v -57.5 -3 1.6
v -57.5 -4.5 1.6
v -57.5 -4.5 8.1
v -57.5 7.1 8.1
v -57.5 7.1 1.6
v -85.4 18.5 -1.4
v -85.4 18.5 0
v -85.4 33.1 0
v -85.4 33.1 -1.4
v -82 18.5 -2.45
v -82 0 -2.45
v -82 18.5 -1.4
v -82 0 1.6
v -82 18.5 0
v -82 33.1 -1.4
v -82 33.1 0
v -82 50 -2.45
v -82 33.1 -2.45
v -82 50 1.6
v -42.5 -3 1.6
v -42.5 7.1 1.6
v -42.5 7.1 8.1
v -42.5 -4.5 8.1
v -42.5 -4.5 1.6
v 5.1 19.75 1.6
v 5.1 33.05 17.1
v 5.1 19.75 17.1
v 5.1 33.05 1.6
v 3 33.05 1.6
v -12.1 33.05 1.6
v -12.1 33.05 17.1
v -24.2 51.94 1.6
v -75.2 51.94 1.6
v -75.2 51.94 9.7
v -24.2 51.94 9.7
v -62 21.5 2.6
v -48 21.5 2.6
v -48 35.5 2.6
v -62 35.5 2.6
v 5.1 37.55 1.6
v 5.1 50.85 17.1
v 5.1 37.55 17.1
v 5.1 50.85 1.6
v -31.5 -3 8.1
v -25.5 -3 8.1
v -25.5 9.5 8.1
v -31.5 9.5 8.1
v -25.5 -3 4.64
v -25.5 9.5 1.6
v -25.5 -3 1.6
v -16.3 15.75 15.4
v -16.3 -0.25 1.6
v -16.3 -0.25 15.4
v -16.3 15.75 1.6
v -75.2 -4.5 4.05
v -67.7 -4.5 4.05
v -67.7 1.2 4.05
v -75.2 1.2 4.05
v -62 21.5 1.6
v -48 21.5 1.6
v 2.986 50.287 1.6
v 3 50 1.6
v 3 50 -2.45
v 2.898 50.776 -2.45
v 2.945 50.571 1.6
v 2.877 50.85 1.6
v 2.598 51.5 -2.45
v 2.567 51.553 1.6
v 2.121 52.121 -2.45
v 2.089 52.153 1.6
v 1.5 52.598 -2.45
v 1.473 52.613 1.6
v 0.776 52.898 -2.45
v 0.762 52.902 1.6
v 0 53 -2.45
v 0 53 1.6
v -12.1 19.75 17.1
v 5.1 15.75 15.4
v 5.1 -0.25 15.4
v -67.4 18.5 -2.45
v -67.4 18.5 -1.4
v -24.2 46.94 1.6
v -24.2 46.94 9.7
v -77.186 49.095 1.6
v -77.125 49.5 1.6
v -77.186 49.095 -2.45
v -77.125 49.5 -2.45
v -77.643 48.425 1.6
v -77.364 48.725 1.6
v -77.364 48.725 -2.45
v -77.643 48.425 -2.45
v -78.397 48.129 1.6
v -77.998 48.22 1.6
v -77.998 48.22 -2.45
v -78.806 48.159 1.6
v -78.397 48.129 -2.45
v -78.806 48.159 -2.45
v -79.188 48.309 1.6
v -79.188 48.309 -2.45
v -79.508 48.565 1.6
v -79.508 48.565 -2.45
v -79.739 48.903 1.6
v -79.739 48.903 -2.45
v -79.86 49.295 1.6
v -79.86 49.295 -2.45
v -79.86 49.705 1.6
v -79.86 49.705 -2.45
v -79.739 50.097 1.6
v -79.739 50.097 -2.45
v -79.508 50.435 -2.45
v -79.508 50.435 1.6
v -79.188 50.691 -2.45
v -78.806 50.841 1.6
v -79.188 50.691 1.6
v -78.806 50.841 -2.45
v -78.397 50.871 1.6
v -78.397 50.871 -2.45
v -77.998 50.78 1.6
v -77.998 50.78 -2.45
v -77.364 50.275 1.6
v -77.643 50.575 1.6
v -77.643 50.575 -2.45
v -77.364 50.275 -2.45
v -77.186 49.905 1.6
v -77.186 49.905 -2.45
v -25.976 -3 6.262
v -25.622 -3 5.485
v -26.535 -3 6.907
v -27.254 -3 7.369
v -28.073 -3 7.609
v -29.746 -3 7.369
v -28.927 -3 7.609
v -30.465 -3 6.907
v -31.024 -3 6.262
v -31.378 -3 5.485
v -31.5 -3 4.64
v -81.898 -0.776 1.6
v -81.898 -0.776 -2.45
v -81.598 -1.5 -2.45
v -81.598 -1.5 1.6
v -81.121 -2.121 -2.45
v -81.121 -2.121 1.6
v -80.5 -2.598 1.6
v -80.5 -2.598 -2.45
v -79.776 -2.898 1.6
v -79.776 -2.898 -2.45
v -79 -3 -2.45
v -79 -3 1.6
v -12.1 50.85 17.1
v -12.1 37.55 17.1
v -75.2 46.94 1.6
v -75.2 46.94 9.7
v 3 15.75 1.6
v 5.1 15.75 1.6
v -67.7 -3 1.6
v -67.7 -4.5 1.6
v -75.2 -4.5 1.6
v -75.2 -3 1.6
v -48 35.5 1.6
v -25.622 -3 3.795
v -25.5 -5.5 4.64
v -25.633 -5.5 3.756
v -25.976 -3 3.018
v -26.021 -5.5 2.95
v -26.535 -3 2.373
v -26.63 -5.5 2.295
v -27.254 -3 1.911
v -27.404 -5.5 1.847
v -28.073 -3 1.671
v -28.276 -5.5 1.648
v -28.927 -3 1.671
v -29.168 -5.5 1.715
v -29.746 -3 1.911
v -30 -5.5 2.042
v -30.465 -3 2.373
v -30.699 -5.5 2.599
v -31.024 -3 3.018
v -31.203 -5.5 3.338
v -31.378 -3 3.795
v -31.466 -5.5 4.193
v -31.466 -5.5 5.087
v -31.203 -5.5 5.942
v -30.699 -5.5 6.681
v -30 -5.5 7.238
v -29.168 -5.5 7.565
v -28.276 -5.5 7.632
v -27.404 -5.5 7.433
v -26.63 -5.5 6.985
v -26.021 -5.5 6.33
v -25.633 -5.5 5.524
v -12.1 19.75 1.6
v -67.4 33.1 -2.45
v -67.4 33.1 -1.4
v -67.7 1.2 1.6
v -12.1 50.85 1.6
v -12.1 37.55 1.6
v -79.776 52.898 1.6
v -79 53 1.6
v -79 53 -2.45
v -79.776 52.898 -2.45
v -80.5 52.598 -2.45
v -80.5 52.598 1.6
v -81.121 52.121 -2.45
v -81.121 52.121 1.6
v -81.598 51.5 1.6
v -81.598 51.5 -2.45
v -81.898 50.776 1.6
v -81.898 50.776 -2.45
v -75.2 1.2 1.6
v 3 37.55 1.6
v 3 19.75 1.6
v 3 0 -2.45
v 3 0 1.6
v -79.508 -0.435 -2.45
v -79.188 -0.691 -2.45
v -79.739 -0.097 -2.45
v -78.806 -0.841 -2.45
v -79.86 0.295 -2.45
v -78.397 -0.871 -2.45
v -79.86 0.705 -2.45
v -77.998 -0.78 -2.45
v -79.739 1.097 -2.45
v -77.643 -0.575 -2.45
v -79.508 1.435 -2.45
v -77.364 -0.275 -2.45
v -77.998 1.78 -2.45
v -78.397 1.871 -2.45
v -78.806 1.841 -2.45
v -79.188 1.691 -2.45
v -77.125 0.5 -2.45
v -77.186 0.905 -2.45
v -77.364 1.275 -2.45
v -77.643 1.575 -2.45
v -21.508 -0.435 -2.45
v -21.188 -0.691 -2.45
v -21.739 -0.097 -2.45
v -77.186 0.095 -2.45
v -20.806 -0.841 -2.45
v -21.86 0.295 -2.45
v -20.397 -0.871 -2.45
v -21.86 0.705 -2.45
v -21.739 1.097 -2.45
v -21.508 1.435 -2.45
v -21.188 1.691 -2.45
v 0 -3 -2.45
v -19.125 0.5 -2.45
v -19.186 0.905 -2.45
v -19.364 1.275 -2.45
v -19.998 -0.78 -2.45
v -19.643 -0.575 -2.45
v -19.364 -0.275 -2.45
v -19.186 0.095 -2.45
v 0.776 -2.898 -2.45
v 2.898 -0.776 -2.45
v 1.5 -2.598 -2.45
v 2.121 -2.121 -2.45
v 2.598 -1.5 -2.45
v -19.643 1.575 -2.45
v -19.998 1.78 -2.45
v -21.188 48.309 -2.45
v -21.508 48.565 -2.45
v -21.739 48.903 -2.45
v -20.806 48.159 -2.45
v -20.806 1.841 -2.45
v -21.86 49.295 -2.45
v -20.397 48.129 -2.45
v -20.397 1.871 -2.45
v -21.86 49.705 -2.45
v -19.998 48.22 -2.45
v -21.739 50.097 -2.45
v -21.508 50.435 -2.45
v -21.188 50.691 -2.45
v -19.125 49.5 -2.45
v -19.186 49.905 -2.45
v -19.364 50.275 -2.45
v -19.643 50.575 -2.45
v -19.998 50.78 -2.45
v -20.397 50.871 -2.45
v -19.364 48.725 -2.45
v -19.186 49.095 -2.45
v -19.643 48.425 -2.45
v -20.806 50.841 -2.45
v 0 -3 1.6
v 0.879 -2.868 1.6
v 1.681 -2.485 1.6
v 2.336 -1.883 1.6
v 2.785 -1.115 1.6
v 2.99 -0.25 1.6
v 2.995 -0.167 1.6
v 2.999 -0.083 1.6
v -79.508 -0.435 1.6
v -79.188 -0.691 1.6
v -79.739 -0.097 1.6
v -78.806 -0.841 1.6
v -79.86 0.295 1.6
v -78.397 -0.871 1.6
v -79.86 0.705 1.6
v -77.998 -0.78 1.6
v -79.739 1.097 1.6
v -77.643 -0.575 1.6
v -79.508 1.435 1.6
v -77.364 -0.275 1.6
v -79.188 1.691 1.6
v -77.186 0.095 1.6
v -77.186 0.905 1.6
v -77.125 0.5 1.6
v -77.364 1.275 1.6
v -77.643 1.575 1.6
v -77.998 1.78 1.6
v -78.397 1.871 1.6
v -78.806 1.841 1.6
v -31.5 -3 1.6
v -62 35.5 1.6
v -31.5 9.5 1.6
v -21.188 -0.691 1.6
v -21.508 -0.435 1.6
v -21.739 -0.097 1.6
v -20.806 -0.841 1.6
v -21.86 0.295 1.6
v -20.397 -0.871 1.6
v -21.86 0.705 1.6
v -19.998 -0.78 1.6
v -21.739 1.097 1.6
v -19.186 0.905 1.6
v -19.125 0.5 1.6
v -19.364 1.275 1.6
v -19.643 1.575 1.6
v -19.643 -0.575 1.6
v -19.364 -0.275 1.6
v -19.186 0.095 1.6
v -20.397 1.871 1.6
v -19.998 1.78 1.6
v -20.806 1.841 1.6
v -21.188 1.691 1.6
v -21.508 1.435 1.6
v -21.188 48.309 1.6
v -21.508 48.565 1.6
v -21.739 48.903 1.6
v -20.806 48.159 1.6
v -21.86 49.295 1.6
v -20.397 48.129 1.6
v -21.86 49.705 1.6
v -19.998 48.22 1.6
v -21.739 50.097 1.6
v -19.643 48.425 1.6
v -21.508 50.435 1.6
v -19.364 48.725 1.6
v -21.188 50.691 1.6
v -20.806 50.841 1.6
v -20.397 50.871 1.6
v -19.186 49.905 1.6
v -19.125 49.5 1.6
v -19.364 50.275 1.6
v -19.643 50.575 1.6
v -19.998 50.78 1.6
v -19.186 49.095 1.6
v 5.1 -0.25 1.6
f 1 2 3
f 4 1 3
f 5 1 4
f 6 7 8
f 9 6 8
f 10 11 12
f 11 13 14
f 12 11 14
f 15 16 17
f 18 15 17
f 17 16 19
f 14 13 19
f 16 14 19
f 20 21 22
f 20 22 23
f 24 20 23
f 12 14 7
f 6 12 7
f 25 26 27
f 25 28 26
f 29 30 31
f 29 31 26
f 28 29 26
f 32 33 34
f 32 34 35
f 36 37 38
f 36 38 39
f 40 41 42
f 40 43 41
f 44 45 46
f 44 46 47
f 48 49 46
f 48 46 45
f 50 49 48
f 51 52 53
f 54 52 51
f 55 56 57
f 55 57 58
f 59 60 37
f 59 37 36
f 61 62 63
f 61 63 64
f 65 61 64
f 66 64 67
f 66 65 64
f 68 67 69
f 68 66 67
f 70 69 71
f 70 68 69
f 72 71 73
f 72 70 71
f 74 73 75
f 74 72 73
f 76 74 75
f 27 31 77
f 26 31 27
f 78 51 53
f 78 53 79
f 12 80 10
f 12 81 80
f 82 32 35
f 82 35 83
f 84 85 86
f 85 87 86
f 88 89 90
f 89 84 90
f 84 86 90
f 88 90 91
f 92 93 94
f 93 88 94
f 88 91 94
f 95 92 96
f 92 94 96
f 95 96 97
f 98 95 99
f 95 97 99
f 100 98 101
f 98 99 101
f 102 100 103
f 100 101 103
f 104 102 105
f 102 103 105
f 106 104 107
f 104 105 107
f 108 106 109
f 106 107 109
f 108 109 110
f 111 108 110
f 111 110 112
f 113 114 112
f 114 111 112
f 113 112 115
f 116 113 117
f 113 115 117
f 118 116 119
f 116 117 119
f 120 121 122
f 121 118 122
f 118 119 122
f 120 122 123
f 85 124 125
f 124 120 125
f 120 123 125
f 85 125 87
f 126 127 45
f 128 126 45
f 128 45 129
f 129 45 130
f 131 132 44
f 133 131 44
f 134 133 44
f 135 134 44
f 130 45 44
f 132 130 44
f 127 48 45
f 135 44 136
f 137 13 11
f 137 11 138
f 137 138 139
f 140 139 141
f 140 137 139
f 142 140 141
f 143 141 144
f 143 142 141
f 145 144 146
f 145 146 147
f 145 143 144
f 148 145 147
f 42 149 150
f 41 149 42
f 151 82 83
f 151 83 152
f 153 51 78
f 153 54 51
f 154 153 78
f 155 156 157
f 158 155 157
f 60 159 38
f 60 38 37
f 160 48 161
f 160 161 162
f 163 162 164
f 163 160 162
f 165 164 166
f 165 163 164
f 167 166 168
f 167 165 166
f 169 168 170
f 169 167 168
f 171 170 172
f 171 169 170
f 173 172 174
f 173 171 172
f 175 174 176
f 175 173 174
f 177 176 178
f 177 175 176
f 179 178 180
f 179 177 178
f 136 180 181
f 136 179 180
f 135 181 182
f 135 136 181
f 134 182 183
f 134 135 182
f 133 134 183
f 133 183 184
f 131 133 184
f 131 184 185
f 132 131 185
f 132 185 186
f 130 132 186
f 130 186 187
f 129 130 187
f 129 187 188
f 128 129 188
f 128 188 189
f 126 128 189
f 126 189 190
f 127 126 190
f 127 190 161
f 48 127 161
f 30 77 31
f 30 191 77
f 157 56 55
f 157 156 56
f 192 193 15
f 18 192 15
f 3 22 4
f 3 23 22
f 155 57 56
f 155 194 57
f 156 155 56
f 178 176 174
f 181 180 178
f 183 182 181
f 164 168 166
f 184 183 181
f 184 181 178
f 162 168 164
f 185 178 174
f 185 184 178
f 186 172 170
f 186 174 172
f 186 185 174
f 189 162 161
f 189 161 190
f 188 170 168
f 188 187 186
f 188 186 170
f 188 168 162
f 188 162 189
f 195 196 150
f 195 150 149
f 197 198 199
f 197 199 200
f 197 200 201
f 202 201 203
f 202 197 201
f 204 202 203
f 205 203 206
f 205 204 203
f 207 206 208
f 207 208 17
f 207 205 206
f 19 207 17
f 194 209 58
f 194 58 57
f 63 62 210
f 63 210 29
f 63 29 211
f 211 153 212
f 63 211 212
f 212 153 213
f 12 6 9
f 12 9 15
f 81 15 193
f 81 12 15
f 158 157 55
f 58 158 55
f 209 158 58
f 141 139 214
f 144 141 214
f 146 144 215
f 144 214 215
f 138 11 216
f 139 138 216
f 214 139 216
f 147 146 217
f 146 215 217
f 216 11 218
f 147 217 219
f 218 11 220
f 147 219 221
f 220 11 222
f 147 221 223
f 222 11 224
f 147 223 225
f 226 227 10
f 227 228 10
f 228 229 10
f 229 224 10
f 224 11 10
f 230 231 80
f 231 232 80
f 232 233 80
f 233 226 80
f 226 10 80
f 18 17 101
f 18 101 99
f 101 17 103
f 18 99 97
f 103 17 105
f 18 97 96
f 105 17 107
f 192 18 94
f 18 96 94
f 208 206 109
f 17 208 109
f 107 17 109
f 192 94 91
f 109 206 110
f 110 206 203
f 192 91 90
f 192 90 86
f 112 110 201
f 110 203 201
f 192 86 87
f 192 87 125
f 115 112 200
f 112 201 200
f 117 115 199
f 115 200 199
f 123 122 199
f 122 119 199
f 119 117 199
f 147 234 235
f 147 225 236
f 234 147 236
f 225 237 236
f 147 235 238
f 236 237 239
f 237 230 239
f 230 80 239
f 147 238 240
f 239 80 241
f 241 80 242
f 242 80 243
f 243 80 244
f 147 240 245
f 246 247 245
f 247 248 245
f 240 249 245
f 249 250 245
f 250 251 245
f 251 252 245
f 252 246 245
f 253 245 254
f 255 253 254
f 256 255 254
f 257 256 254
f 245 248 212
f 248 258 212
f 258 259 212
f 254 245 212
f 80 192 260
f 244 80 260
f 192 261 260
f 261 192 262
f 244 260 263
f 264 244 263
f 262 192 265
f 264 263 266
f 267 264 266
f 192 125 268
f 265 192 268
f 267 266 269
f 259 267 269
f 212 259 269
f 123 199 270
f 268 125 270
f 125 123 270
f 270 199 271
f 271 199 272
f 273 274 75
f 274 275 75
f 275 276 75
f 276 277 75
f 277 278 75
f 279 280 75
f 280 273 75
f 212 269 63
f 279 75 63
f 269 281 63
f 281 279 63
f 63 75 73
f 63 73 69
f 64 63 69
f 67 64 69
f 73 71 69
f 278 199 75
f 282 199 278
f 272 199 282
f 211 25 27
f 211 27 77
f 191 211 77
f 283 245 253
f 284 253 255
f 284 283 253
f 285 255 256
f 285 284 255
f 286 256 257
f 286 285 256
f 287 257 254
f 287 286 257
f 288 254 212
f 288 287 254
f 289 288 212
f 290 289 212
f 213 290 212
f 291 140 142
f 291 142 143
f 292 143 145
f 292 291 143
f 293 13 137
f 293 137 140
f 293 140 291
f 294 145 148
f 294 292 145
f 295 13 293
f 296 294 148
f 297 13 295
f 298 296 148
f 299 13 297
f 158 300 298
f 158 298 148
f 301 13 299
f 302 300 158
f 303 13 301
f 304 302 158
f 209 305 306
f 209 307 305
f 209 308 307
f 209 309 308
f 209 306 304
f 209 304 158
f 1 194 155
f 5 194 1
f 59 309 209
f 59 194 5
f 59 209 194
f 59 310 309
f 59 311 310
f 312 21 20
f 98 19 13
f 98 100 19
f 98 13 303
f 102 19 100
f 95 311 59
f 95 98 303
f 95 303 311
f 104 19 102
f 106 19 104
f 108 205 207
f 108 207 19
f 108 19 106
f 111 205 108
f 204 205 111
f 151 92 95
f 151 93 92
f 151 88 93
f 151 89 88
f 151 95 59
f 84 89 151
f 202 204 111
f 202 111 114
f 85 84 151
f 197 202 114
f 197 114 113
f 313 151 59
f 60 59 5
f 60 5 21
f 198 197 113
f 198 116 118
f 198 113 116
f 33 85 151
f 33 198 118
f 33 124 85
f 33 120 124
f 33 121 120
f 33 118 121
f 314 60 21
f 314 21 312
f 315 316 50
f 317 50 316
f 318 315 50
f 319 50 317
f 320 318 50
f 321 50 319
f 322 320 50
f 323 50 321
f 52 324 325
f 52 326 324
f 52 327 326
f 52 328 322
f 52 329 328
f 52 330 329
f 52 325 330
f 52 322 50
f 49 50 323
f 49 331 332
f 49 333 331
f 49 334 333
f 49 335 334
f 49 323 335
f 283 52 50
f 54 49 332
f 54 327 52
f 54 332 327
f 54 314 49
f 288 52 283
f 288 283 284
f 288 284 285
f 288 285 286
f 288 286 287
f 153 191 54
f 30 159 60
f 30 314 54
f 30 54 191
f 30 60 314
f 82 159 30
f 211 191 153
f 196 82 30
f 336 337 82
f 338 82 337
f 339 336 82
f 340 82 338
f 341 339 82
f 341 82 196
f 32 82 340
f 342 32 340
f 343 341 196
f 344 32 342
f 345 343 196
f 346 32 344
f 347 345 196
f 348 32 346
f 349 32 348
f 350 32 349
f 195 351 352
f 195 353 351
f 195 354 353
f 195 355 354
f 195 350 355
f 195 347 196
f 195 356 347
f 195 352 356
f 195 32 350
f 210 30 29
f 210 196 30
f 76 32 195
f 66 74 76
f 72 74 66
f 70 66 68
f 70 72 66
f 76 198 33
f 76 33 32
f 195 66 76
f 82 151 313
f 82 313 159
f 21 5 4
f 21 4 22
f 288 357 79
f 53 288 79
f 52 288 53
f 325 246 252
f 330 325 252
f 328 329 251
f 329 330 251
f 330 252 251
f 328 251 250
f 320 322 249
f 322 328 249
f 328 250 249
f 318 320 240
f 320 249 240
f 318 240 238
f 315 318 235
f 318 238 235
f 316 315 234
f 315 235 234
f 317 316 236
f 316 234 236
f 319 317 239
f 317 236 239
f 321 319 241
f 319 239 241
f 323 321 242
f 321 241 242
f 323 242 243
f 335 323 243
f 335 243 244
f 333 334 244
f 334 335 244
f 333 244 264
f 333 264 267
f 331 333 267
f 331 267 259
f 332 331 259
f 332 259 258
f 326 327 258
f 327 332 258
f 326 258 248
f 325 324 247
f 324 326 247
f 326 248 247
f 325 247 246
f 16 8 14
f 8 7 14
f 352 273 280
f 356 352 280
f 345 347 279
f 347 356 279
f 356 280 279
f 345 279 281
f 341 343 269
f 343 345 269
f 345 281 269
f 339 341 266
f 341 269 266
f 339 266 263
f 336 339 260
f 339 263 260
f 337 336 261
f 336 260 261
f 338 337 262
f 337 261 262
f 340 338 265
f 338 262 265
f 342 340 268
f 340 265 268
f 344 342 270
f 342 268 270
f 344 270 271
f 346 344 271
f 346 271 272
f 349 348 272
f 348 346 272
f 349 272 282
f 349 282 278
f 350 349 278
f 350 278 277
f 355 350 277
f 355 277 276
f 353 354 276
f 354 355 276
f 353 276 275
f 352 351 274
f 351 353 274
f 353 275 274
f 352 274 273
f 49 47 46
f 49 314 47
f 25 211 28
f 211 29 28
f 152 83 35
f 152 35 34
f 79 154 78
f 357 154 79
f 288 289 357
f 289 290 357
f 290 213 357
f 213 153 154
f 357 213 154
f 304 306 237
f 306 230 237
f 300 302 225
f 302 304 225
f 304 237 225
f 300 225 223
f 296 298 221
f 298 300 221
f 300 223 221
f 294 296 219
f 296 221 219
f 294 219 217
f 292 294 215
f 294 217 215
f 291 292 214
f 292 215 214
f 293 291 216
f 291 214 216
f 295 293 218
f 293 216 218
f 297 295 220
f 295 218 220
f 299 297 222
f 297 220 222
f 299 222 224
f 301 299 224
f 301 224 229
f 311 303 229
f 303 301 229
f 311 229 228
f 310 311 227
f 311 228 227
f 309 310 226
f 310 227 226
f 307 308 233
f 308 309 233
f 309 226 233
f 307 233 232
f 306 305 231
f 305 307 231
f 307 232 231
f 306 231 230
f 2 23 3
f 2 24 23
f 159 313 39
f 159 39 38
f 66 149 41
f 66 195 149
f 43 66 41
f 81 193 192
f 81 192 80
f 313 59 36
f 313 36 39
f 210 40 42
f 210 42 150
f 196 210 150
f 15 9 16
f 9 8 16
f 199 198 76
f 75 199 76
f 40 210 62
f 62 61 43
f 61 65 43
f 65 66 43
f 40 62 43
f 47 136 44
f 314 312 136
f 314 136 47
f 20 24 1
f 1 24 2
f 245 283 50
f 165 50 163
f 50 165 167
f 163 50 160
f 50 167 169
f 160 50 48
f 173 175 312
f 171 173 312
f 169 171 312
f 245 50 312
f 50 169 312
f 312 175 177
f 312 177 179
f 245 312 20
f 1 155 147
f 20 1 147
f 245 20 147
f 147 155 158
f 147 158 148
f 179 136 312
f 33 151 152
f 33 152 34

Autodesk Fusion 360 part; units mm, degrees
sketch "Sketch1" plane through (0, 0, 0) normal (0, 0, 1) x (1, 0, 0)
  line L0 (0, -3) -> (-79, -3)
  line L1 (-82, 0) -> (-82, 50)
  line L2 (-79, 53) -> (0, 53)
  line L3 (3, 50) -> (3, 0)
  arc A0 (-79, 53) -> (-82, 50) centre (-79, 50) ccw
  arc A1 (-82, 0) -> (-79, -3) centre (-79, 0) ccw
  arc A2 (3, 50) -> (0, 53) centre (0, 50) ccw
  arc A3 (0, -3) -> (3, 0) centre (0, 0) ccw
  circle A4 centre (-78.5, 49.5) radius 1.375
  circle A5 centre (-78.5, 0.5) radius 1.375
  circle A6 centre (-20.5, 49.5) radius 1.375
  circle A7 centre (-20.5, 0.5) radius 1.375
  dimension "d1" = 3
  dimension "d2" = 85
  dimension "d3" = 56
  dimension "d4" = 49
  dimension "d5" = 0.5
  dimension "d6" = 0.5
  dimension "d7" = 2.75
  dimension "d8" = 2.75
  dimension "d9" = 3.5
  dimension "d10" = 2.75
  dimension "d11" = 2.75
  dimension "d12" = 58
  dimension "d13" = 58
  dimension "d14" = 49
  dimension "d15" = 49
extrude "Extrude1" add sketch "Sketch1" along normal blind 1.6
sketch "Sketch2" plane through (0, 0, 0) normal (0, 0, -1) x (1, 0, 0)
  circle A0 centre (-20.5, -49.5) radius 1.375
  circle A1 centre (-78.5, -0.5) radius 1.375
  circle A2 centre (-20.5, -0.5) radius 1.375
  circle A3 centre (-78.5, -49.5) radius 1.375
  arc A4 (-79, 3) -> (-82, 0) centre (-79, 0) ccw
  line L0 (-82, 0) -> (-82, -50)
  arc A5 (-82, -50) -> (-79, -53) centre (-79, -50) ccw
  line L1 (-79, -53) -> (0, -53)
  arc A6 (0, -53) -> (3, -50) centre (0, -50) ccw
  line L2 (3, -50) -> (3, 0)
  arc A7 (3, 0) -> (0, 3) centre (0, 0) ccw
  line L3 (0, 3) -> (-79, 3)
  line L4 (-67.4, -18.5) -> (-85.4, -18.5)
  line L5 (-85.4, -18.5) -> (-85.4, -33.1)
  line L6 (-85.4, -33.1) -> (-67.4, -33.1)
  line L7 (-67.4, -33.1) -> (-67.4, -18.5)
  dimension "d18" = 14.6
  dimension "d19" = 19.9
  dimension "d20" = 18
  dimension "d21" = 3.4
extrude "Extrude2" add sketch "Sketch2" along normal blind 1.4 contours L0 L4 L6 L7 | L0 L4 L5 L6
extrude "Extrude3" add 1 faces at (-36.7049, 22.8333, 0) along direction (0, 0, -1) blind 2.45
sketch "Sketch3" plane through (0, 0, 1.6) normal (0, 0, 1) x (-1, 0, 0)
  circle A0 centre (20.5, -49.5) radius 1.375
  circle A1 centre (78.5, -0.5) radius 1.375
  circle A2 centre (20.5, -0.5) radius 1.375
  circle A3 centre (78.5, -49.5) radius 1.375
  arc A4 (82, 0) -> (79, 3) centre (79, 0) ccw
  line L0 (79, 3) -> (0, 3)
  arc A5 (0, 3) -> (-3, 0) centre (0, 0) ccw
  line L1 (-3, 0) -> (-3, -50)
  arc A6 (-3, -50) -> (0, -53) centre (0, -50) ccw
  line L2 (0, -53) -> (79, -53)
  arc A7 (79, -53) -> (82, -50) centre (79, -50) ccw
  line L3 (82, -50) -> (82, 0)
  line L4 (31.5, -9.5) -> (25.5, -9.5)
  line L5 (25.5, -9.5) -> (25.5, 3)
  line L6 (25.5, 3) -> (31.5, 3)
  line L7 (31.5, 3) -> (31.5, -9.5)
  line L8 (57.5, -7.1) -> (42.5, -7.1)
  line L9 (42.5, -7.1) -> (42.5, 4.5)
  line L10 (42.5, 4.5) -> (57.5, 4.5)
  line L11 (57.5, 4.5) -> (57.5, -7.1)
  line L12 (75.2, -1.2) -> (67.7, -1.2)
  line L13 (67.7, -1.2) -> (67.7, 4.5)
  line L14 (67.7, 4.5) -> (75.2, 4.5)
  line L15 (75.2, 4.5) -> (75.2, -1.2)
  dimension "d26" = 7.5
  dimension "d27" = 10.2
  dimension "d28" = 15
  dimension "d29" = 11
  dimension "d30" = 6
  dimension "d31" = 28.5
  dimension "d32" = 12.5
  dimension "d33" = 1.5
  dimension "d34" = 1.5
  dimension "d35" = 11.6
  dimension "d36" = 5.7
extrude "Extrude4" add sketch "Sketch3" along normal blind 6.5 contours L0 L8 L9 L11 | L0 L9 L10 L11 | L0 L4 L5 L6 L7
extrude "Extrude5" add sketch "Sketch3" along normal blind 2.45 contours L0 L12 L13 L15 | L0 L13 L14 L15
sketch "Sketch4" plane through (0, -3, 0) normal (0, -1, 0) x (1, 0, 0)
  line L0 (0, -2.45) -> (0, 1.6)
  line L1 (0, 1.6) -> (-25.5, 1.6)
  line L2 (-25.5, 1.6) -> (-25.5, 8.1)
  line L3 (-25.5, 8.1) -> (-31.5, 8.1)
  line L4 (-31.5, 8.1) -> (-31.5, 1.6)
  line L5 (-31.5, 1.6) -> (-42.5, 1.6)
  line L6 (-42.5, 1.6) -> (-57.5, 1.6)
  line L7 (-57.5, 1.6) -> (-67.7, 1.6)
  line L8 (-67.7, 1.6) -> (-75.2, 1.6)
  line L9 (-75.2, 1.6) -> (-79, 1.6)
  line L10 (-79, 1.6) -> (-79, -2.45)
  line L11 (-79, -2.45) -> (0, -2.45)
  circle A0 centre (-28.5, 4.64) radius 3
  line L12 (-25.5, 1.6) -> (-31.5, 1.6)
  dimension "d41" = 6
  dimension "d42" = 3
  dimension "d43" = 3.04
extrude "Extrude6" add sketch "Sketch4" along normal blind 2.5 contours A0
sketch "Sketch5" plane through (0, 0, 1.6) normal (0, 0, 1) x (1, 0, 0)
  line L0 (5.1, -0.25) -> (-16.3, -0.25)
  line L1 (-16.3, -0.25) -> (-16.3, 15.75)
  line L2 (-16.3, 15.75) -> (5.1, 15.75)
  line L3 (5.1, 15.75) -> (5.1, -0.25)
  line L4 (5.1, 19.75) -> (-12.1, 19.75)
  line L5 (-12.1, 19.75) -> (-12.1, 33.05)
  line L6 (-12.1, 33.05) -> (5.1, 33.05)
  line L7 (5.1, 33.05) -> (5.1, 19.75)
  line L8 (5.1, 37.55) -> (-12.1, 37.55)
  line L9 (-12.1, 37.55) -> (-12.1, 50.85)
  line L10 (-12.1, 50.85) -> (5.1, 50.85)
  line L11 (5.1, 50.85) -> (5.1, 37.55)
  line L12 (3, 0) -> (3, 50)
  line L13 (-79, -3) -> (0, -3)
  dimension "d46" = 13.3
  dimension "d47" = 13.3
  dimension "d48" = 16
  dimension "d49" = 2.1
  dimension "d50" = 2.1
  dimension "d51" = 2.1
  dimension "d52" = 4.5
  dimension "d53" = 4
  dimension "d54" = 2.75
  dimension "d55" = 21.4
  dimension "d56" = 17.2
  dimension "d57" = 17.2
extrude "Extrude7" add sketch "Sketch5" along normal blind 15.5 contours L8 L9 L10 L11 | L4 L5 L6 L12 | L4 L6 L7 L12
extrude "Extrude8" add sketch "Sketch5" along normal blind 13.8 contours L0 L1 L2 L3
sketch "Sketch6" plane through (0, 0, 1.6) normal (0, 0, 1) x (-1, 0, 0)
  line L0 (16.3, -15.75) -> (-3, -15.75)
  line L1 (-3, -15.75) -> (-3, -19.75)
  line L2 (-3, -19.75) -> (12.1, -19.75)
  line L3 (12.1, -19.75) -> (12.1, -33.05)
  line L4 (12.1, -33.05) -> (-3, -33.05)
  line L5 (-3, -33.05) -> (-3, -37.55)
  line L6 (-3, -37.55) -> (12.1, -37.55)
  line L7 (12.1, -37.55) -> (12.1, -50.85)
  line L8 (12.1, -50.85) -> (-2.8771, -50.85)
  arc A0 (-2.8771, -50.85) -> (0, -53) centre (0, -50) ccw
  line L9 (0, -53) -> (79, -53)
  arc A1 (79, -53) -> (82, -50) centre (79, -50) ccw
  line L10 (82, -50) -> (82, 0)
  arc A2 (82, 0) -> (79, 3) centre (79, 0) ccw
  line L11 (79, 3) -> (75.2, 3)
  line L12 (75.2, 3) -> (75.2, -1.2)
  line L13 (75.2, -1.2) -> (67.7, -1.2)
  line L14 (67.7, -1.2) -> (67.7, 3)
  line L15 (67.7, 3) -> (57.5, 3)
  line L16 (57.5, 3) -> (57.5, -7.1)
  line L17 (57.5, -7.1) -> (42.5, -7.1)
  line L18 (42.5, -7.1) -> (42.5, 3)
  line L19 (42.5, 3) -> (31.5, 3)
  line L20 (31.5, 3) -> (31.5, -9.5)
  line L21 (31.5, -9.5) -> (25.5, -9.5)
  line L22 (25.5, -9.5) -> (25.5, 3)
  line L23 (25.5, 3) -> (0, 3)
  arc A3 (0, 3) -> (-2.9896, 0.25) centre (0, 0) ccw
  line L24 (-2.9896, 0.25) -> (16.3, 0.25)
  line L25 (16.3, 0.25) -> (16.3, -15.75)
  circle A4 centre (20.5, -49.5) radius 1.375
  circle A5 centre (78.5, -0.5) radius 1.375
  circle A6 centre (20.5, -0.5) radius 1.375
  circle A7 centre (78.5, -49.5) radius 1.375
  line L26 (75.2, -51.94) -> (24.2, -51.94)
  line L27 (24.2, -51.94) -> (24.2, -46.94)
  line L28 (24.2, -46.94) -> (75.2, -46.94)
  line L29 (75.2, -46.94) -> (75.2, -51.94)
  dimension "d62" = 6.8
  dimension "d63" = 1.06
  dimension "d64" = 51
  dimension "d65" = 5
extrude "Extrude9" add sketch "Sketch6" along normal blind 8.1 contours L26 L27 L28 L29
sketch "Sketch7" plane through (0, 0, 1.6) normal (0, 0, 1) x (-1, 0, 0)
  line L0 (75.2, -46.94) -> (75.2, -51.94)
  line L1 (75.2, -51.94) -> (24.2, -51.94)
  line L2 (24.2, -51.94) -> (24.2, -46.94)
  line L3 (24.2, -46.94) -> (75.2, -46.94)
  line L4 (16.3, -15.75) -> (-3, -15.75)
  line L5 (-3, -15.75) -> (-3, -19.75)
  line L6 (-3, -19.75) -> (12.1, -19.75)
  line L7 (12.1, -19.75) -> (12.1, -33.05)
  line L8 (12.1, -33.05) -> (-3, -33.05)
  line L9 (-3, -33.05) -> (-3, -37.55)
  line L10 (-3, -37.55) -> (12.1, -37.55)
  line L11 (12.1, -37.55) -> (12.1, -50.85)
  line L12 (12.1, -50.85) -> (-2.8771, -50.85)
  arc A0 (-2.8771, -50.85) -> (0, -53) centre (0, -50) ccw
  line L13 (0, -53) -> (79, -53)
  arc A1 (79, -53) -> (82, -50) centre (79, -50) ccw
  line L14 (82, -50) -> (82, 0)
  arc A2 (82, 0) -> (79, 3) centre (79, 0) ccw
  line L15 (79, 3) -> (75.2, 3)
  line L16 (75.2, 3) -> (75.2, -1.2)
  line L17 (75.2, -1.2) -> (67.7, -1.2)
  line L18 (67.7, -1.2) -> (67.7, 3)
  line L19 (67.7, 3) -> (57.5, 3)
  line L20 (57.5, 3) -> (57.5, -7.1)
  line L21 (57.5, -7.1) -> (42.5, -7.1)
  line L22 (42.5, -7.1) -> (42.5, 3)
  line L23 (42.5, 3) -> (31.5, 3)
  line L24 (31.5, 3) -> (31.5, -9.5)
  line L25 (31.5, -9.5) -> (25.5, -9.5)
  line L26 (25.5, -9.5) -> (25.5, 3)
  line L27 (25.5, 3) -> (0, 3)
  arc A3 (0, 3) -> (-2.9896, 0.25) centre (0, 0) ccw
  line L28 (-2.9896, 0.25) -> (16.3, 0.25)
  line L29 (16.3, 0.25) -> (16.3, -15.75)
  circle A4 centre (20.5, -49.5) radius 1.375
  circle A5 centre (78.5, -0.5) radius 1.375
  circle A6 centre (20.5, -0.5) radius 1.375
  circle A7 centre (78.5, -49.5) radius 1.375
  line L30 (62, -35.5) -> (48, -35.5)
  line L31 (48, -35.5) -> (48, -21.5)
  line L32 (48, -21.5) -> (62, -21.5)
  line L33 (62, -21.5) -> (62, -35.5)
  line L34 (79, -53) -> (0, -53)
  line L35 (82, 0) -> (82, -50)
  dimension "d68" = 31.5
  dimension "d69" = 34
  dimension "d70" = 14
  dimension "d71" = 14
extrude "Extrude10" add sketch "Sketch7" along normal blind 1 contours L30 L31 L32 L33
equation "d8 = d7"
equation "d10 = d7"
equation "d11 = d7"
equation "d13 = d12"
equation "d14 = d4"
equation "d15 = d4"
equation "d21 = d20 - 14.6 mm"
equation "d47 = d46"
equation "d50 = d49"
equation "d51 = d49"
equation "d57 = d56"
